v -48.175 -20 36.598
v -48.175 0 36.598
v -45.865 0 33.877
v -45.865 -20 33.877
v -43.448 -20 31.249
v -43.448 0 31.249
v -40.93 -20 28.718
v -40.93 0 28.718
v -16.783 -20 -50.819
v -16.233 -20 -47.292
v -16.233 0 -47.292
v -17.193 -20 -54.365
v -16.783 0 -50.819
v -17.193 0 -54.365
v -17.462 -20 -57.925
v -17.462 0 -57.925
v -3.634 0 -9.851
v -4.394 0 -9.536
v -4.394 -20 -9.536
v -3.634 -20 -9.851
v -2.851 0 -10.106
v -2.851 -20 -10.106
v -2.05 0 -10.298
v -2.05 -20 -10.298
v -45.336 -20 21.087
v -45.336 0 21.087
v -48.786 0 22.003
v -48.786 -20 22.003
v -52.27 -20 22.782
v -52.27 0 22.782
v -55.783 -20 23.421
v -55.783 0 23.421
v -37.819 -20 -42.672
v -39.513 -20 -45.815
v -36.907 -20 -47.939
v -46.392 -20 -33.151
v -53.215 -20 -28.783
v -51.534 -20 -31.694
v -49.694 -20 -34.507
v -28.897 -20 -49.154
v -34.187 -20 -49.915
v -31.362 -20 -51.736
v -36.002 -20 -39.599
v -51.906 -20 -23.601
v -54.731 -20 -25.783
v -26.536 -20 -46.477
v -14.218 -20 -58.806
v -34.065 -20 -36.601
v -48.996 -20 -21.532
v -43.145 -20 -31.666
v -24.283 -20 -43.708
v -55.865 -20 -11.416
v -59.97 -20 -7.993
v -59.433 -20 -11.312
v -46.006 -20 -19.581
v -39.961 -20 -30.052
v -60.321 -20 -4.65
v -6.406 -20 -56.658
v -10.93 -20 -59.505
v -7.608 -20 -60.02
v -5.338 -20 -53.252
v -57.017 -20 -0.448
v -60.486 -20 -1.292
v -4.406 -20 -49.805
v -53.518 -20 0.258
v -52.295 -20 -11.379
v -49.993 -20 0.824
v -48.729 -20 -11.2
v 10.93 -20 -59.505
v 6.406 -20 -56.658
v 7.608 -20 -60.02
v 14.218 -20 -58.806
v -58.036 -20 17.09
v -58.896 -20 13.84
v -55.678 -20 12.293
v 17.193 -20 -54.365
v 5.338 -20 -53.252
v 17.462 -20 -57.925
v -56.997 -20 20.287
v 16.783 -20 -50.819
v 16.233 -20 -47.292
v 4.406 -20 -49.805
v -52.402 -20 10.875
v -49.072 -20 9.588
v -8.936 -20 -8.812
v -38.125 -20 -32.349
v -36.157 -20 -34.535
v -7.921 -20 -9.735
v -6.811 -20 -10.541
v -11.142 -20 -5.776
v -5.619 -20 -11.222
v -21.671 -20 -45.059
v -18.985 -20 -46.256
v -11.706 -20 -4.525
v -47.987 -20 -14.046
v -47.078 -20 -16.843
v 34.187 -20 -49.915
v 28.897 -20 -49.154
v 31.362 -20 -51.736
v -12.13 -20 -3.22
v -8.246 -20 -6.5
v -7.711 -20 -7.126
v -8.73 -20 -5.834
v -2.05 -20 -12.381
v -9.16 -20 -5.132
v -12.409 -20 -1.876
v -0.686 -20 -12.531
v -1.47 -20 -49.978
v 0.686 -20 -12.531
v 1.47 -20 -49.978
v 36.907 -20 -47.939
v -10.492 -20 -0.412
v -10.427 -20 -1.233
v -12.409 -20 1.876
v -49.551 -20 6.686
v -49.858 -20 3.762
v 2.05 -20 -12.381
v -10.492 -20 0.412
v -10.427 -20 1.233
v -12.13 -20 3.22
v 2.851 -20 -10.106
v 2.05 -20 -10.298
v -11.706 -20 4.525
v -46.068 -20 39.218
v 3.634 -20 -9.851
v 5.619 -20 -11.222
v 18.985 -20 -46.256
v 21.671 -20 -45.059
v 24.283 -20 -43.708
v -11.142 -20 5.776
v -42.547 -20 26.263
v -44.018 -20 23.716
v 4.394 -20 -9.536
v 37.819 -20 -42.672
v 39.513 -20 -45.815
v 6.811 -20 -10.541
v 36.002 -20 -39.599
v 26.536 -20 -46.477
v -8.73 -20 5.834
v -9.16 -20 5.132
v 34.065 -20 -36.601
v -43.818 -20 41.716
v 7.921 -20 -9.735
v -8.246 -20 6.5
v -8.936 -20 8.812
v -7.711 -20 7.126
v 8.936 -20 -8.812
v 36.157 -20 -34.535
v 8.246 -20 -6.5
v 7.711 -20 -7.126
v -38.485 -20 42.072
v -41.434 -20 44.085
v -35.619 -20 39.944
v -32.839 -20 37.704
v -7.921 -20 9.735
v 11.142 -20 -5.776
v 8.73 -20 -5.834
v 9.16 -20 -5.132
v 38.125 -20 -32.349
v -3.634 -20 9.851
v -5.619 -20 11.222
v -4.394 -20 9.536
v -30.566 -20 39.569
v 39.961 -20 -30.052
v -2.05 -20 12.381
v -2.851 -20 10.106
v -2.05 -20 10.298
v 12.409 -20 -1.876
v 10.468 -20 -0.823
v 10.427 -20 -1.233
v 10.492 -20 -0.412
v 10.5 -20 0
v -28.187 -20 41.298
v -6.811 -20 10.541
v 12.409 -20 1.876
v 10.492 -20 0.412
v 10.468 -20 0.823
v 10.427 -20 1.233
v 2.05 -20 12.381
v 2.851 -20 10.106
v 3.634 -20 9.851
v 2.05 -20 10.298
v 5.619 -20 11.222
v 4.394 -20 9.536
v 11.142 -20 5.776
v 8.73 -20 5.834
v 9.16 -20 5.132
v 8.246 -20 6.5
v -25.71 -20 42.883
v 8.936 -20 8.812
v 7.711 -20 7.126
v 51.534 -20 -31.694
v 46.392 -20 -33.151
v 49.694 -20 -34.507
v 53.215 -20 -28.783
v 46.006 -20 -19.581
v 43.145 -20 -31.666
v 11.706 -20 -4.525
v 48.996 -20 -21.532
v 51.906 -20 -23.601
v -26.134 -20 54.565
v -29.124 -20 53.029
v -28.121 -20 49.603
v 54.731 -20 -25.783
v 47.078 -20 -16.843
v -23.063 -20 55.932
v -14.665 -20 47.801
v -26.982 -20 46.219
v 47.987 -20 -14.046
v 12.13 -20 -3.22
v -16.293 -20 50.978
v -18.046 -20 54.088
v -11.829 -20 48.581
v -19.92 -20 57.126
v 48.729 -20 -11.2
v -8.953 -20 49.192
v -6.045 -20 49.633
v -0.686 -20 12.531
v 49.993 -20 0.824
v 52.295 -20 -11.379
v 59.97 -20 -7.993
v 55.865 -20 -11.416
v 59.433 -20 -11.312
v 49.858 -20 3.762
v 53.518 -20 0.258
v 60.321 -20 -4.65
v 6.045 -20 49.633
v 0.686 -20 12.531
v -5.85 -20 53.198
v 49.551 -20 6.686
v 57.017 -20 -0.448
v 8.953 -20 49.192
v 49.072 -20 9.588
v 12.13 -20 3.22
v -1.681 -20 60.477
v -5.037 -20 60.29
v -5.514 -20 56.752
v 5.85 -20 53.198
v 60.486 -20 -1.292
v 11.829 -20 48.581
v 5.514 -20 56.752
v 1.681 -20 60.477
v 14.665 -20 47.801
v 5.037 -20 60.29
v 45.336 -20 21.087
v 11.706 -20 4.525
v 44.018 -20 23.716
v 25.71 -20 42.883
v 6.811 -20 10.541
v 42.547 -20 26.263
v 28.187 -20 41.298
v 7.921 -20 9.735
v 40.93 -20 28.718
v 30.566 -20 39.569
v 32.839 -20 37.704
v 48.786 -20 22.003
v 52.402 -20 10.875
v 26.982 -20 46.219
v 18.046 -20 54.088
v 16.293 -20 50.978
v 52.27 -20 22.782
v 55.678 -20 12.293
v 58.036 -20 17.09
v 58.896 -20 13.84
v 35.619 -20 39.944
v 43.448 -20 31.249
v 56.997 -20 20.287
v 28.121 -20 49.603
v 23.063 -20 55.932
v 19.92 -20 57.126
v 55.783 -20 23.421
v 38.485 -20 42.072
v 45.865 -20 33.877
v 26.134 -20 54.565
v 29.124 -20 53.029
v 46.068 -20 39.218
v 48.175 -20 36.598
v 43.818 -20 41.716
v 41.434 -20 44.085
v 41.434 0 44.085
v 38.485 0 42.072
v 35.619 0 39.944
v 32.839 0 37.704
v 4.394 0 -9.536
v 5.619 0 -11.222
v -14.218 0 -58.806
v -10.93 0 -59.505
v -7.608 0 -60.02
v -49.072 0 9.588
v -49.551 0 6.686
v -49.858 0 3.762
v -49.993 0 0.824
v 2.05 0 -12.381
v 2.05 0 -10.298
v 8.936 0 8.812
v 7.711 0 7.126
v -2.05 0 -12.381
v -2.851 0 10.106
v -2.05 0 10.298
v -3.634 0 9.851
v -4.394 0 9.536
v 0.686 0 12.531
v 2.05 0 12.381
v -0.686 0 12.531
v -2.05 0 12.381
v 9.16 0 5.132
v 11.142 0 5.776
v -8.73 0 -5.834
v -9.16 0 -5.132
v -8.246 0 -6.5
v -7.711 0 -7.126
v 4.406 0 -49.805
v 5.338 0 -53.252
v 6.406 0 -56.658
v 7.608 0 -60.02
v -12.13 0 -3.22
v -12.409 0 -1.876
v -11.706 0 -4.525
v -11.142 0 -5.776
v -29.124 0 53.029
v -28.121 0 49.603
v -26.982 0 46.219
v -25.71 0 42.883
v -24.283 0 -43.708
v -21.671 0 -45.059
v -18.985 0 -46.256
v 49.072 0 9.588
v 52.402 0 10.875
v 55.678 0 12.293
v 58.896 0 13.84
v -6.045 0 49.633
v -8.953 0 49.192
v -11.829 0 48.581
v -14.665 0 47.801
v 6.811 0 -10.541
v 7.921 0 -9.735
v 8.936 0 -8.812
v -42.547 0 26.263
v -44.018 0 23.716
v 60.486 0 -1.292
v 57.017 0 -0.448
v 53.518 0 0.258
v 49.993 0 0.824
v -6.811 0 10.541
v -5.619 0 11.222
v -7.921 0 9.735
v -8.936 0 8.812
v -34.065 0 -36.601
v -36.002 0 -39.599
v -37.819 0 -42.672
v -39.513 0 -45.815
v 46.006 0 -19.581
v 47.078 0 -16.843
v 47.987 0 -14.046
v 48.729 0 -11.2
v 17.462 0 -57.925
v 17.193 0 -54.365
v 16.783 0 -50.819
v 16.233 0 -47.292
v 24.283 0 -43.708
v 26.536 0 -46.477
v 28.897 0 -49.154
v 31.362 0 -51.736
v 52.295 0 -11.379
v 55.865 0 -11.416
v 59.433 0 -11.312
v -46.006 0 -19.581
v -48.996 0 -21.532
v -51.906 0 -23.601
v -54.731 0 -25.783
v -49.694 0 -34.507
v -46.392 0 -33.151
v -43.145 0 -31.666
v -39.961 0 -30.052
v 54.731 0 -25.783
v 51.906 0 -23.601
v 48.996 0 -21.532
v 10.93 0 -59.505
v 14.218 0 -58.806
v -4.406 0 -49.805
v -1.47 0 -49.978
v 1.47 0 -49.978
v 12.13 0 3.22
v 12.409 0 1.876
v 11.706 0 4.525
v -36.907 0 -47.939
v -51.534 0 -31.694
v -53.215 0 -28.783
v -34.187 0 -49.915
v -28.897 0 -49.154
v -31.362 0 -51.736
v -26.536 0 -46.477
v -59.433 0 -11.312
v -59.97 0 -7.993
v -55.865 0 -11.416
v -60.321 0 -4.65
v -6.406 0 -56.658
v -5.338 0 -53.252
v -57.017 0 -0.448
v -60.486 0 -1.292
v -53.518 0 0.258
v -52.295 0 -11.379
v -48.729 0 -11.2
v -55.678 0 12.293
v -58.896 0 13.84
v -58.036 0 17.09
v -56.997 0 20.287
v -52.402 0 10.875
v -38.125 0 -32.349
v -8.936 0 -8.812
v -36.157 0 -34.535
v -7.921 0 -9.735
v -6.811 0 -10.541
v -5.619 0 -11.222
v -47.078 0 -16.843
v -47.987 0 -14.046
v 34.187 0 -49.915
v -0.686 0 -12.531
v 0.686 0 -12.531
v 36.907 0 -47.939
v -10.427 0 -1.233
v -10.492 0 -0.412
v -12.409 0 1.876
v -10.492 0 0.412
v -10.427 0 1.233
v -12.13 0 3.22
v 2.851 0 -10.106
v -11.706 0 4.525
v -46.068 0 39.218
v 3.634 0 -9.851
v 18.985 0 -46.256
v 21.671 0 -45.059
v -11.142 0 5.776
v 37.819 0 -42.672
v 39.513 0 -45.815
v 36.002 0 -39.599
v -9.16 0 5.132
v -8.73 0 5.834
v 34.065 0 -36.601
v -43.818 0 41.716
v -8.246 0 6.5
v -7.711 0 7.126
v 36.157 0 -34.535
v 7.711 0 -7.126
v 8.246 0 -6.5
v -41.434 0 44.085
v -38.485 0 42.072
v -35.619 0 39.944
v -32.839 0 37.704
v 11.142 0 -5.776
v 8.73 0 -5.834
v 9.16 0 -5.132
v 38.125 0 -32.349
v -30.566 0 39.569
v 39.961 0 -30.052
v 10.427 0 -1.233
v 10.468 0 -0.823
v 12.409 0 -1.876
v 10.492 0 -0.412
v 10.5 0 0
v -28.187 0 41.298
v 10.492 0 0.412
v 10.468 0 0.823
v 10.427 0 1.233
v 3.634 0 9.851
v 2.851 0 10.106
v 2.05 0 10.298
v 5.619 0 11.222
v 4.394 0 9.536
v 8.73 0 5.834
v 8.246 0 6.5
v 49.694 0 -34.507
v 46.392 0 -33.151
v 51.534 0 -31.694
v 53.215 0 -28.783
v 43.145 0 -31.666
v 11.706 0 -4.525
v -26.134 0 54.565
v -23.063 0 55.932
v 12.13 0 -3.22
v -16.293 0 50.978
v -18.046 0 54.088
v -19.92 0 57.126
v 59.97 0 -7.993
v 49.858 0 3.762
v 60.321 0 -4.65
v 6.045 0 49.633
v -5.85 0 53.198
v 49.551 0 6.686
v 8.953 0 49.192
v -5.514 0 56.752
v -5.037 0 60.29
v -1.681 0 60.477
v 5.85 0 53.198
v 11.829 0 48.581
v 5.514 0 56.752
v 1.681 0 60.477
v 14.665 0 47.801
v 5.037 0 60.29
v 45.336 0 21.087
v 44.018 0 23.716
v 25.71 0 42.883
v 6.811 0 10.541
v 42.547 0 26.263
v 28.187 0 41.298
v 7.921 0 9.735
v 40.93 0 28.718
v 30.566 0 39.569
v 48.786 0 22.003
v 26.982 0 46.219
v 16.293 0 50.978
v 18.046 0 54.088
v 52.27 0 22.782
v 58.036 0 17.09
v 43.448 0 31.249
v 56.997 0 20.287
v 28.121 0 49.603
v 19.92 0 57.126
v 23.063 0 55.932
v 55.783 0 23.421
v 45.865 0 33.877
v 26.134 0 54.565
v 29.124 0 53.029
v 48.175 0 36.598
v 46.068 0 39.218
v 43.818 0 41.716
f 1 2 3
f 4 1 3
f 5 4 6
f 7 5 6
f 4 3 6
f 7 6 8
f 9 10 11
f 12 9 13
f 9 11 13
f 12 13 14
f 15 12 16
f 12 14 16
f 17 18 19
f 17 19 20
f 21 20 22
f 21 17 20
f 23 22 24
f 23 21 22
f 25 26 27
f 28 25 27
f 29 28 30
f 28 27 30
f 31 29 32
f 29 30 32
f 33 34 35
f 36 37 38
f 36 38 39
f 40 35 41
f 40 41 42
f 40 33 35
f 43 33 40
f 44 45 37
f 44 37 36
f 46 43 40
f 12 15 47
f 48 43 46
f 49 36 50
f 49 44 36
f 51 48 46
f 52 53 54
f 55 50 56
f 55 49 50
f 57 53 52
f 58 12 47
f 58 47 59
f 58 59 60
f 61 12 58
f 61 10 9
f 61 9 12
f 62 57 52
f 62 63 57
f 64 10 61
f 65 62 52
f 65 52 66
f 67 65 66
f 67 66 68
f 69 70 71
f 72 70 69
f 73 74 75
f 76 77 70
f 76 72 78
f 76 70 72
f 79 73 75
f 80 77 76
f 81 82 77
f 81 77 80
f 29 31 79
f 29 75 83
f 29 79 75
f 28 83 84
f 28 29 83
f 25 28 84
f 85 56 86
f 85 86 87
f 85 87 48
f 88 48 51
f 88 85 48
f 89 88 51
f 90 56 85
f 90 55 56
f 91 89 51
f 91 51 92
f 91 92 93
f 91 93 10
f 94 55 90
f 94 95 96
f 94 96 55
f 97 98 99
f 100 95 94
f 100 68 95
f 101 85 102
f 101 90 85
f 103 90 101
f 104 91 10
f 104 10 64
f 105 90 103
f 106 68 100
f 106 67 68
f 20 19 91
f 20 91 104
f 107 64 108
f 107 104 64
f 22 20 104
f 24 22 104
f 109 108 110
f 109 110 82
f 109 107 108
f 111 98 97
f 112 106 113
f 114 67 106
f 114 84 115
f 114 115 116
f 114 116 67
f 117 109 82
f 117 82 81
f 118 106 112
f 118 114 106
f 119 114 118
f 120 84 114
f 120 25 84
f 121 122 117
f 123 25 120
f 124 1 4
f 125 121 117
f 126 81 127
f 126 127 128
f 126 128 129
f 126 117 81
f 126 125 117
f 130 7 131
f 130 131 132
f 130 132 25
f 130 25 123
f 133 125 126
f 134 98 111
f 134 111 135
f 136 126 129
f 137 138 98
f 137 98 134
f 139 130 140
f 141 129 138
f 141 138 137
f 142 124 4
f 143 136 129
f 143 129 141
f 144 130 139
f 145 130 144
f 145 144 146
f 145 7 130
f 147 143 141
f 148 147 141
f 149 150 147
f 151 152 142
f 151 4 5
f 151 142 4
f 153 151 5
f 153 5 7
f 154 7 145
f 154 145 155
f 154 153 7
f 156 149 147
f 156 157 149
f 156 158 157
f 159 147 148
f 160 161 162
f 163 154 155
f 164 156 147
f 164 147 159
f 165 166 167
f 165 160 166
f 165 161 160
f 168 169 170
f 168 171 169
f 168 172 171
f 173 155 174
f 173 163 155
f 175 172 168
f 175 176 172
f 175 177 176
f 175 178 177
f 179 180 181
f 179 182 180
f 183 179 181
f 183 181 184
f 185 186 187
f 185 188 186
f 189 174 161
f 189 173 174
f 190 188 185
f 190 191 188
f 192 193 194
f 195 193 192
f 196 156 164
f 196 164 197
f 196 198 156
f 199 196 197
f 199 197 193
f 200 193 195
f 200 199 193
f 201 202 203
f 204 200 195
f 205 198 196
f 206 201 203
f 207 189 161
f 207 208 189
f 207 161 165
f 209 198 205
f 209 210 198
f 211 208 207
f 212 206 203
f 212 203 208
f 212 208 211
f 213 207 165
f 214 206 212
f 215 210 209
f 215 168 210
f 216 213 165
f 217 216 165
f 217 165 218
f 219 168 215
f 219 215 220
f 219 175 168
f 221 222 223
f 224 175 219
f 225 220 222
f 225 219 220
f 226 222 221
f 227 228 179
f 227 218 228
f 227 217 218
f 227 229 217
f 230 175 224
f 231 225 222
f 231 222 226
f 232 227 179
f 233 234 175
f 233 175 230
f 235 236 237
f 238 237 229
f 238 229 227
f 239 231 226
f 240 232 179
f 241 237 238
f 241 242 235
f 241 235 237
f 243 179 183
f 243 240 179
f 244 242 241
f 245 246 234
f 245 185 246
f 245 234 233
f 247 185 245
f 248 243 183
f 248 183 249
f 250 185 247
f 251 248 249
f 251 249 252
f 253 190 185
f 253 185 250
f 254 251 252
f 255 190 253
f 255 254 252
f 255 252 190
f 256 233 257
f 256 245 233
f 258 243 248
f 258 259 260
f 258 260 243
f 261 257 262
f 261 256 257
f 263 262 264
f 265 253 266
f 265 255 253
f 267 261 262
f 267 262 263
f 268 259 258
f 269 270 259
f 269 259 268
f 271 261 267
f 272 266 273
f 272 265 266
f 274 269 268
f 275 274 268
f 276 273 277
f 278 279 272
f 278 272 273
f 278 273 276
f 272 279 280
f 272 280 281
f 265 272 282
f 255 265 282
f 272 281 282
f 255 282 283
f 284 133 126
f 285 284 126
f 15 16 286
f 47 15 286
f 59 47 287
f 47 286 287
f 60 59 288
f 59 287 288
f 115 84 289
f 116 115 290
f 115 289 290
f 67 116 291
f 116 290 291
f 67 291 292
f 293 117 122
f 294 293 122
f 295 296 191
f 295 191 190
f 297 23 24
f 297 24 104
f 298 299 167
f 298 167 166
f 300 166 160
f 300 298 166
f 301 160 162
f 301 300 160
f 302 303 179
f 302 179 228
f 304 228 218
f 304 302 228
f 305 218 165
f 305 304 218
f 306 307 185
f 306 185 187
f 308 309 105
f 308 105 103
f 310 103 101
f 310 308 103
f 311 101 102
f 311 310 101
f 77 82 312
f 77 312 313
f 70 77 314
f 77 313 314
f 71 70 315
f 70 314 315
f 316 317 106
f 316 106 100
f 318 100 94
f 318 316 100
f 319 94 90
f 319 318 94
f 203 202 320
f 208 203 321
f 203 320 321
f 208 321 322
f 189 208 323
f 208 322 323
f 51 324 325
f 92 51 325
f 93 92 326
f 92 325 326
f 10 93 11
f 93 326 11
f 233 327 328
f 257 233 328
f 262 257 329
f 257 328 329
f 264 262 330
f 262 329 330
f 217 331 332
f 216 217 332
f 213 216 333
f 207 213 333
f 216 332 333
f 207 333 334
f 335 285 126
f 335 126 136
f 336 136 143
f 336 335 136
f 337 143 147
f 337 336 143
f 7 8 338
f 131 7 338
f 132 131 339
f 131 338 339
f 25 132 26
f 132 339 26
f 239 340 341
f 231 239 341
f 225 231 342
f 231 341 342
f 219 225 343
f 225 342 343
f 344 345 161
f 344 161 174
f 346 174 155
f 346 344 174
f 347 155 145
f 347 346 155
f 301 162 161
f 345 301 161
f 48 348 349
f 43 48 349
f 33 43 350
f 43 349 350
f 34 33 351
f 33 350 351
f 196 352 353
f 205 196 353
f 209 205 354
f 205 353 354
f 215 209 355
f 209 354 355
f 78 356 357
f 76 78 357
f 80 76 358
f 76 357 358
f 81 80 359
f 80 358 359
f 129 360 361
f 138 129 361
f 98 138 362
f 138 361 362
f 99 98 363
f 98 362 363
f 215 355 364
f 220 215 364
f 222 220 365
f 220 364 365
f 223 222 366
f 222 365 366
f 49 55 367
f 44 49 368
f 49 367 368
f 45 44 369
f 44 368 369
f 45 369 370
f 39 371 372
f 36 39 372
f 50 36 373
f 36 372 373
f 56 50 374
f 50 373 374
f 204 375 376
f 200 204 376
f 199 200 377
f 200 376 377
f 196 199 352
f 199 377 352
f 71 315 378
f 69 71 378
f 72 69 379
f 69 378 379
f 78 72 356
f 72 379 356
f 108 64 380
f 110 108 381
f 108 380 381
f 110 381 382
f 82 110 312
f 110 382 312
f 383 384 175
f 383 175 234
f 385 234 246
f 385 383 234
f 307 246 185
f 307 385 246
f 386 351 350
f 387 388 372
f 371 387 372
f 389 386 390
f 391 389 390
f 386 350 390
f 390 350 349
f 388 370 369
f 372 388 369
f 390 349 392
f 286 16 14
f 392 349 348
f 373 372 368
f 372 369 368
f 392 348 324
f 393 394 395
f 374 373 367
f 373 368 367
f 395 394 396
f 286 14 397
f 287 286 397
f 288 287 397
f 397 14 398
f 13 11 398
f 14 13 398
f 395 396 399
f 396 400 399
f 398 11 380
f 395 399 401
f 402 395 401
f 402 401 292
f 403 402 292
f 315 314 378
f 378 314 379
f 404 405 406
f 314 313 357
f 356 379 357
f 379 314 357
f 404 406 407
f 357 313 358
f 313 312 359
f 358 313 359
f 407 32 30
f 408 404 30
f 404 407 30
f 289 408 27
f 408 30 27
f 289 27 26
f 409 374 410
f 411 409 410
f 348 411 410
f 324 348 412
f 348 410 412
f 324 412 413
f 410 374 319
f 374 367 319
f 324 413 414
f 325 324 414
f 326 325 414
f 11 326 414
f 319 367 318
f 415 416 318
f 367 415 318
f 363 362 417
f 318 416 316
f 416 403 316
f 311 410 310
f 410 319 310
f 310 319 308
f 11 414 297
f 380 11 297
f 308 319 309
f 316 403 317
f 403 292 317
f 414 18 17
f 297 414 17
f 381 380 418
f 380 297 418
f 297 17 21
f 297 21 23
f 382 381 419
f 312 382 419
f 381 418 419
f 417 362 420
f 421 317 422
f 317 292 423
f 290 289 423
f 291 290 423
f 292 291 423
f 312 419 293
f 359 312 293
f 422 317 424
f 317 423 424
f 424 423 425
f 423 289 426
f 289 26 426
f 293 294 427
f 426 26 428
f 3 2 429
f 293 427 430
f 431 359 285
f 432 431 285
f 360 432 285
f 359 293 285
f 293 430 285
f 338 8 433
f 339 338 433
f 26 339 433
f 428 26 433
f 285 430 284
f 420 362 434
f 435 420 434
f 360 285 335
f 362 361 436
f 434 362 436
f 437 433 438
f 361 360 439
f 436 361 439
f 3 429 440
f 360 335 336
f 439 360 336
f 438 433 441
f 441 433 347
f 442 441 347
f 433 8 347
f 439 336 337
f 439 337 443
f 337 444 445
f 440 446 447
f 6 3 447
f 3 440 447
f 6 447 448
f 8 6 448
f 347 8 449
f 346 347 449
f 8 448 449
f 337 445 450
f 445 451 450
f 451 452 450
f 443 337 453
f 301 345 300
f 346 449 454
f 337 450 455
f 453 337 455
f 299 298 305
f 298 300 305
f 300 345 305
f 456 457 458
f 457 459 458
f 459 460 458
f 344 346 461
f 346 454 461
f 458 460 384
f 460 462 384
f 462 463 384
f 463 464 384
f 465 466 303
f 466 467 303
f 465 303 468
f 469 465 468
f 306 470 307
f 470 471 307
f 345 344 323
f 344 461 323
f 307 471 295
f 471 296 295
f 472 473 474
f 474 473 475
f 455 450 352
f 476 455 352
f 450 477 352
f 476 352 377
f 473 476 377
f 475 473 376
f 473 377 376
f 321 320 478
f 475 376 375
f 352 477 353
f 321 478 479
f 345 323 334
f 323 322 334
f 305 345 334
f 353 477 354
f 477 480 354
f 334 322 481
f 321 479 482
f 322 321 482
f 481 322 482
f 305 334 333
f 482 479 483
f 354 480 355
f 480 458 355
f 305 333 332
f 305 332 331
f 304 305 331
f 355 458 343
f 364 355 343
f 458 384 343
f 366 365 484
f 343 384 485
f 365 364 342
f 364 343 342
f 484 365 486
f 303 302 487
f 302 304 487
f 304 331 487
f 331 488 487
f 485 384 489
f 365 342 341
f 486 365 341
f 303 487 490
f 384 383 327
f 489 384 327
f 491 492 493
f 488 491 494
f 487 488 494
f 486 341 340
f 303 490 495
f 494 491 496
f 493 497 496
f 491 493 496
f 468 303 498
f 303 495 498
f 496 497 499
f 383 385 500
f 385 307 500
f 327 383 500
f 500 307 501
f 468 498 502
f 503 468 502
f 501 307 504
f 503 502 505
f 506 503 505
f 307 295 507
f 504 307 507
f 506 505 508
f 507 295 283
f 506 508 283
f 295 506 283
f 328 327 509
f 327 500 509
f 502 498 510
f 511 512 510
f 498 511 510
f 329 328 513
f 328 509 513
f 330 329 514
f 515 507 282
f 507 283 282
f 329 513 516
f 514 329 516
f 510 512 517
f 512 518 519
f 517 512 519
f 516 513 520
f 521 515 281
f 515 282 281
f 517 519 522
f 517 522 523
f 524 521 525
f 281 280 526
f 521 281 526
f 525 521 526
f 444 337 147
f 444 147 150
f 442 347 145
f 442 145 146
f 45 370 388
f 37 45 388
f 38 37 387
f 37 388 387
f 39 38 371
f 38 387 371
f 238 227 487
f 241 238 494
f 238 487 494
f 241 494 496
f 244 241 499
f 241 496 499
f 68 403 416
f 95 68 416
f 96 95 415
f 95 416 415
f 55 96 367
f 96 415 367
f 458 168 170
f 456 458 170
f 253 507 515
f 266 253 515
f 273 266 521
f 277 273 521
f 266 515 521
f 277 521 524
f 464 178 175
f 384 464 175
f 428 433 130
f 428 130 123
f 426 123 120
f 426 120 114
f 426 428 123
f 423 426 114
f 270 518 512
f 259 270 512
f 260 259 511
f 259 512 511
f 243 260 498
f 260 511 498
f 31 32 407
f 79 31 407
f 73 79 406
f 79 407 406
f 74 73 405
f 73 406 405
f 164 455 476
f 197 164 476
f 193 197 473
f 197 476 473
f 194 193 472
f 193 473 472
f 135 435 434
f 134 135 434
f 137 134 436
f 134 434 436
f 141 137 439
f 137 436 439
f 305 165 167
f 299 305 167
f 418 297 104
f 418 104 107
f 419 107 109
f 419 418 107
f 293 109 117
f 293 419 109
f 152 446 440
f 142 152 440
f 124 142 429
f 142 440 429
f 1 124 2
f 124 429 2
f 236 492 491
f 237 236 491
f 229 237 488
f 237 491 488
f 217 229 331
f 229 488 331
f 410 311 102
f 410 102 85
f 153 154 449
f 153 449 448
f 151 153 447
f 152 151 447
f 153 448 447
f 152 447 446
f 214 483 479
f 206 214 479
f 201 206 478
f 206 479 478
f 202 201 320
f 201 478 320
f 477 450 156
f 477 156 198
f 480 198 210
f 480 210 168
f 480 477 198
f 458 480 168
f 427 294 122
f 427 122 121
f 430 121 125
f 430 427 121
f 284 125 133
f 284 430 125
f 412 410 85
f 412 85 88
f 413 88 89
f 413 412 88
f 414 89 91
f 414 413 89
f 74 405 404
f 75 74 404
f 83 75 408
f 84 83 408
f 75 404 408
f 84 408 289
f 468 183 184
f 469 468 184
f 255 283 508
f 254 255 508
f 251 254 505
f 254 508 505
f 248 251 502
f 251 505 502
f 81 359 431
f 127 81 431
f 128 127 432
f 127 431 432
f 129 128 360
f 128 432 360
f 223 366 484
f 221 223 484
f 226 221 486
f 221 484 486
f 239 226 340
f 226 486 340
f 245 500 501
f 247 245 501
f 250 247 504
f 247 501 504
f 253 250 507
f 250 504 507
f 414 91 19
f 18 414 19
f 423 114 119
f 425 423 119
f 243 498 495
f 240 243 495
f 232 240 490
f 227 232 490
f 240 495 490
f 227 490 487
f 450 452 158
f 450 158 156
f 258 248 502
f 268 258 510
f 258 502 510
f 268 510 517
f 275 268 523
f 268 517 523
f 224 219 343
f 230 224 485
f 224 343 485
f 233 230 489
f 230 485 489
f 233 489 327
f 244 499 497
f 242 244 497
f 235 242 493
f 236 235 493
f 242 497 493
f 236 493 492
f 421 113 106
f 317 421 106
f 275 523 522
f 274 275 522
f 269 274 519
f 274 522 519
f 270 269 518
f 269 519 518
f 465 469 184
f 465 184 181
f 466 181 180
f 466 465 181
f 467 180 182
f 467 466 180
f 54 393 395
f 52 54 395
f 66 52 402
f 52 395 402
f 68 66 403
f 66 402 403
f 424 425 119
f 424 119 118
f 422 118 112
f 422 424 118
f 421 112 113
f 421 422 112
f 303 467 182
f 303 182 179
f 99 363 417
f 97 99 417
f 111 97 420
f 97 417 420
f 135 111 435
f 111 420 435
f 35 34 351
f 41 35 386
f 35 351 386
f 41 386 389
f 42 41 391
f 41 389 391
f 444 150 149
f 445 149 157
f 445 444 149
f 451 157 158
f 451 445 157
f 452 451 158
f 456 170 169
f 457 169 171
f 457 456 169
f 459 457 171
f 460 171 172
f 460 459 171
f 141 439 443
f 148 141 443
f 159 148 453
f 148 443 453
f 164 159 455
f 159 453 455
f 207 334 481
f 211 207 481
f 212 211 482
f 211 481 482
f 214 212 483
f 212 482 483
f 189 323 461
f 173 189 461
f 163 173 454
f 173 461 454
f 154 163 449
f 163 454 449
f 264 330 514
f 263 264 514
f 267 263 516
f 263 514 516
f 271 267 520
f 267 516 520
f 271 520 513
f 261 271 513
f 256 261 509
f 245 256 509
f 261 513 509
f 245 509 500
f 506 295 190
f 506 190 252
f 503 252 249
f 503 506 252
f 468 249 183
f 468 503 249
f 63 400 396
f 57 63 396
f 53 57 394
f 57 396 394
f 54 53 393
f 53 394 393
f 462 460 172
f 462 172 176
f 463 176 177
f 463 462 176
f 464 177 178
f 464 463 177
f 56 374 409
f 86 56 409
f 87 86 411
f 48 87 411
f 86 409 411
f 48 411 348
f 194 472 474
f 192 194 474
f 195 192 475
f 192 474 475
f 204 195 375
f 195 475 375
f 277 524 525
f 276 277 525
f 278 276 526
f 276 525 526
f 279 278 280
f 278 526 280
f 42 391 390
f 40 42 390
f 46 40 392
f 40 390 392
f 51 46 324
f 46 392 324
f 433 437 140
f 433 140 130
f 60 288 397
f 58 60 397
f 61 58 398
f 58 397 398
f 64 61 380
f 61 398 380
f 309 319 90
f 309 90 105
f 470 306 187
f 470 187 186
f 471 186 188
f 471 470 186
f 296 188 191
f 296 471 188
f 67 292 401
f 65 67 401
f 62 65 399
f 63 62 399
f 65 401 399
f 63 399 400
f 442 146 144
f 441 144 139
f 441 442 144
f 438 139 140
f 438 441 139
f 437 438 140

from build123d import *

# Parameters (mm, degrees)
F1_DEPTH = 20
F3_DEPTH = 20


with BuildPart() as f1:
    # F0 (on Front) → F1 (new body)
    with BuildSketch(Plane.XZ):
        with BuildLine():
            ThreePointArc((48.729363, -11.200408), (49.681325, -5.636126), (50, 0))
            ThreePointArc((50, 0), (49.998301, 0.412138), (49.993206, 0.824248))
            ThreePointArc((49.993206, 0.824248), (49.726095, 5.226423), (49.072105, 9.587936))
            ThreePointArc((49.072105, 9.587936), (47.552826, 15.45085), (45.335814, 21.087057))
            ThreePointArc((45.335814, 21.087057), (43.30127, 25), (40.929834, 28.718438))
            ThreePointArc((40.929834, 28.718438), (37.157241, 33.45653), (32.839448, 37.703722))
            ThreePointArc((32.839448, 37.703722), (29.389263, 40.45085), (25.710422, 42.883262))
            ThreePointArc((25.710422, 42.883262), (20.336832, 45.677273), (14.664844, 47.801071))
            ThreePointArc((14.664844, 47.801071), (10.395585, 48.90738), (6.045446, 49.63318))
            ThreePointArc((6.045446, 49.63318), (0, 50), (-6.045446, 49.63318))
            ThreePointArc((-6.045446, 49.63318), (-10.395585, 48.90738), (-14.664844, 47.801071))
            ThreePointArc((-14.664844, 47.801071), (-20.336832, 45.677273), (-25.710422, 42.883262))
            ThreePointArc((-25.710422, 42.883262), (-29.389263, 40.45085), (-32.839448, 37.703722))
            ThreePointArc((-32.839448, 37.703722), (-37.157241, 33.45653), (-40.929834, 28.718438))
            ThreePointArc((-40.929834, 28.718438), (-43.30127, 25), (-45.335814, 21.087057))
            ThreePointArc((-45.335814, 21.087057), (-47.552826, 15.45085), (-49.072105, 9.587936))
            ThreePointArc((-49.072105, 9.587936), (-49.726095, 5.226423), (-49.993206, 0.824248))
            ThreePointArc((-49.993206, 0.824248), (-49.726095, -5.226423), (-48.729363, -11.200408))
            ThreePointArc((-48.729363, -11.200408), (-47.552826, -15.45085), (-46.006318, -19.581081))
            ThreePointArc((-46.006318, -19.581081), (-43.30127, -25), (-39.960872, -30.0521))
            ThreePointArc((-39.960872, -30.0521), (-37.157241, -33.45653), (-34.06452, -36.600663))
            ThreePointArc((-34.06452, -36.600663), (-29.389263, -40.45085), (-24.282783, -43.70751))
            ThreePointArc((-24.282783, -43.70751), (-20.336832, -45.677273), (-16.232657, -47.291657))
            ThreePointArc((-16.232657, -47.291657), (-10.395585, -48.90738), (-4.40598, -49.805495))
            ThreePointArc((-4.40598, -49.805495), (0, -50), (4.40598, -49.805495))
            ThreePointArc((4.40598, -49.805495), (10.395585, -48.90738), (16.232657, -47.291657))
            ThreePointArc((16.232657, -47.291657), (20.336832, -45.677273), (24.282783, -43.70751))
            ThreePointArc((24.282783, -43.70751), (29.389263, -40.45085), (34.06452, -36.600663))
            ThreePointArc((34.06452, -36.600663), (37.157241, -33.45653), (39.960872, -30.0521))
            ThreePointArc((39.960872, -30.0521), (43.30127, -25), (46.006318, -19.581081))
            ThreePointArc((46.006318, -19.581081), (47.552826, -15.45085), (48.729363, -11.200408))
        make_face()
        with BuildLine():
            ThreePointArc((-25.710422, 42.883262), (-20.336832, 45.677273), (-14.664844, 47.801071))
            ThreePointArc((-14.664844, 47.801071), (-17.153833, 52.541957), (-19.920351, 57.126435))
            ThreePointArc((-19.920351, 57.126435), (-24.607567, 55.2695), (-29.123899, 53.028752))
            ThreePointArc((-29.123899, 53.028752), (-27.568128, 47.905214), (-25.710422, 42.883262))
        make_face()
        with BuildLine():
            ThreePointArc((-6.045446, 49.63318), (0, 50), (6.045446, 49.63318))
            ThreePointArc((6.045446, 49.63318), (5.699933, 54.976558), (5.037269, 60.289932))
            ThreePointArc((5.037269, 60.289932), (0, 60.5), (-5.037269, 60.289932))
            ThreePointArc((-5.037269, 60.289932), (-5.699933, 54.976558), (-6.045446, 49.63318))
        make_face()
        with BuildLine():
            ThreePointArc((14.664844, 47.801071), (20.336832, 45.677273), (25.710422, 42.883262))
            ThreePointArc((25.710422, 42.883262), (27.568128, 47.905214), (29.123899, 53.028752))
            ThreePointArc((29.123899, 53.028752), (24.607567, 55.2695), (19.920351, 57.126435))
            ThreePointArc((19.920351, 57.126435), (17.153833, 52.541957), (14.664844, 47.801071))
        make_face()
        with BuildLine():
            ThreePointArc((32.839448, 37.703722), (37.157241, 33.45653), (40.929834, 28.718438))
            ThreePointArc((40.929834, 28.718438), (44.669544, 32.550622), (48.174742, 36.598419))
            ThreePointArc((48.174742, 36.598419), (44.960262, 40.482402), (41.43356, 44.085259))
            ThreePointArc((41.43356, 44.085259), (37.041545, 41.022373), (32.839448, 37.703722))
        make_face()
        with BuildLine():
            ThreePointArc((45.335814, 21.087057), (47.552826, 15.45085), (49.072105, 9.587936))
            ThreePointArc((49.072105, 9.587936), (54.04719, 11.567733), (58.895735, 13.839886))
            ThreePointArc((58.895735, 13.839886), (57.538919, 18.695528), (55.782531, 23.421341))
            ThreePointArc((55.782531, 23.421341), (50.524438, 22.409649), (45.335814, 21.087057))
        make_face()
        with BuildLine():
            ThreePointArc((49.993206, 0.824248), (49.998301, 0.412138), (50, 0))
            ThreePointArc((50, 0), (49.681325, -5.636126), (48.729363, -11.200408))
            ThreePointArc((48.729363, -11.200408), (54.079586, -11.415323), (59.43312, -11.311688))
            ThreePointArc((59.43312, -11.311688), (60.168575, -6.323972), (60.486196, -1.29234))
            ThreePointArc((60.486196, -1.29234), (55.271196, -0.077907), (49.993206, 0.824248))
        make_face()
        with BuildLine():
            ThreePointArc((54.731247, -25.782563), (50.461062, -22.551992), (46.006318, -19.581081))
            ThreePointArc((46.006318, -19.581081), (43.30127, -25), (39.960872, -30.0521))
            ThreePointArc((39.960872, -30.0521), (44.76113, -32.424566), (49.693979, -34.507369))
            ThreePointArc((49.693979, -34.507369), (52.394537, -30.25), (54.731247, -25.782563))
        make_face()
        with BuildLine():
            ThreePointArc((39.512769, -45.814747), (36.925753, -41.126633), (34.06452, -36.600663))
            ThreePointArc((34.06452, -36.600663), (29.389263, -40.45085), (24.282783, -43.70751))
            ThreePointArc((24.282783, -43.70751), (27.703068, -47.827306), (31.362297, -51.736412))
            ThreePointArc((31.362297, -51.736412), (35.561008, -48.945528), (39.512769, -45.814747))
        make_face()
        with BuildLine():
            ThreePointArc((17.462174, -57.925145), (17.005645, -52.590106), (16.232657, -47.291657))
            ThreePointArc((16.232657, -47.291657), (10.395585, -48.90738), (4.40598, -49.805495))
            ThreePointArc((4.40598, -49.805495), (5.854894, -54.960271), (7.607789, -60.01976))
            ThreePointArc((7.607789, -60.01976), (12.578657, -59.17793), (17.462174, -57.925145))
        make_face()
        with BuildLine():
            ThreePointArc((-7.607789, -60.01976), (-5.854894, -54.960271), (-4.40598, -49.805495))
            ThreePointArc((-4.40598, -49.805495), (-10.395585, -48.90738), (-16.232657, -47.291657))
            ThreePointArc((-16.232657, -47.291657), (-17.005645, -52.590106), (-17.462174, -57.925145))
            ThreePointArc((-17.462174, -57.925145), (-12.578657, -59.17793), (-7.607789, -60.01976))
        make_face()
        with BuildLine():
            ThreePointArc((-31.362297, -51.736412), (-27.703068, -47.827306), (-24.282783, -43.70751))
            ThreePointArc((-24.282783, -43.70751), (-29.389263, -40.45085), (-34.06452, -36.600663))
            ThreePointArc((-34.06452, -36.600663), (-36.925753, -41.126633), (-39.512769, -45.814747))
            ThreePointArc((-39.512769, -45.814747), (-35.561008, -48.945528), (-31.362297, -51.736412))
        make_face()
        with BuildLine():
            ThreePointArc((-49.693979, -34.507369), (-44.76113, -32.424566), (-39.960872, -30.0521))
            ThreePointArc((-39.960872, -30.0521), (-43.30127, -25), (-46.006318, -19.581081))
            ThreePointArc((-46.006318, -19.581081), (-50.461062, -22.551992), (-54.731247, -25.782563))
            ThreePointArc((-54.731247, -25.782563), (-52.394537, -30.25), (-49.693979, -34.507369))
        make_face()
        with BuildLine():
            ThreePointArc((-59.43312, -11.311688), (-54.079586, -11.415323), (-48.729363, -11.200408))
            ThreePointArc((-48.729363, -11.200408), (-49.726095, -5.226423), (-49.993206, 0.824248))
            ThreePointArc((-49.993206, 0.824248), (-55.271196, -0.077907), (-60.486196, -1.29234))
            ThreePointArc((-60.486196, -1.29234), (-60.168575, -6.323972), (-59.43312, -11.311688))
        make_face()
        with BuildLine():
            ThreePointArc((-49.072105, 9.587936), (-47.552826, 15.45085), (-45.335814, 21.087057))
            ThreePointArc((-45.335814, 21.087057), (-50.524438, 22.409649), (-55.782531, 23.421341))
            ThreePointArc((-55.782531, 23.421341), (-57.538919, 18.695528), (-58.895735, 13.839886))
            ThreePointArc((-58.895735, 13.839886), (-54.04719, 11.567733), (-49.072105, 9.587936))
        make_face()
        with BuildLine():
            ThreePointArc((-40.929834, 28.718438), (-37.157241, 33.45653), (-32.839448, 37.703722))
            ThreePointArc((-32.839448, 37.703722), (-37.041545, 41.022373), (-41.43356, 44.085259))
            ThreePointArc((-41.43356, 44.085259), (-44.960262, 40.482402), (-48.174742, 36.598419))
            ThreePointArc((-48.174742, 36.598419), (-44.669544, 32.550622), (-40.929834, 28.718438))
        make_face()
    extrude(amount=F1_DEPTH)

    # F2 (on Front) → F3 (cut)
    with BuildSketch(Plane.XZ):
        with BuildLine():
            ThreePointArc((10.427405, -1.232572), (10.481835, -0.617354), (10.5, 0))
            ThreePointArc((10.5, 0), (10.481835, 0.617354), (10.427405, 1.232572))
            ThreePointArc((10.427405, 1.232572), (9.986093, 3.244678), (9.160435, 5.131903))
            ThreePointArc((9.160435, 5.131903), (8.494678, 6.171745), (7.71146, 7.126246))
            ThreePointArc((7.71146, 7.126246), (6.171745, 8.494678), (4.39449, 9.536166))
            ThreePointArc((4.39449, 9.536166), (3.244678, 9.986093), (2.05, 10.297937))
            ThreePointArc((2.05, 10.297937), (0, 10.5), (-2.05, 10.297937))
            ThreePointArc((-2.05, 10.297937), (-3.244678, 9.986093), (-4.39449, 9.536166))
            ThreePointArc((-4.39449, 9.536166), (-6.171745, 8.494678), (-7.71146, 7.126246))
            ThreePointArc((-7.71146, 7.126246), (-8.494678, 6.171745), (-9.160435, 5.131903))
            ThreePointArc((-9.160435, 5.131903), (-9.986093, 3.244678), (-10.427405, 1.232572))
            ThreePointArc((-10.427405, 1.232572), (-10.5, 0), (-10.427405, -1.232572))
            ThreePointArc((-10.427405, -1.232572), (-9.986093, -3.244678), (-9.160435, -5.131903))
            ThreePointArc((-9.160435, -5.131903), (-8.494678, -6.171745), (-7.71146, -7.126246))
            ThreePointArc((-7.71146, -7.126246), (-6.171745, -8.494678), (-4.39449, -9.536166))
            ThreePointArc((-4.39449, -9.536166), (-3.244678, -9.986093), (-2.05, -10.297937))
            ThreePointArc((-2.05, -10.297937), (0, -10.5), (2.05, -10.297937))
            ThreePointArc((2.05, -10.297937), (3.244678, -9.986093), (4.39449, -9.536166))
            ThreePointArc((4.39449, -9.536166), (6.171745, -8.494678), (7.71146, -7.126246))
            ThreePointArc((7.71146, -7.126246), (8.494678, -6.171745), (9.160435, -5.131903))
            ThreePointArc((9.160435, -5.131903), (9.986093, -3.244678), (10.427405, -1.232572))
        make_face()
        with BuildLine():
            ThreePointArc((-7.71146, 7.126246), (-6.171745, 8.494678), (-4.39449, 9.536166))
            Line((-4.39449, 9.536166), (-5.619142, 11.221753))
            ThreePointArc((-5.619142, 11.221753), (-7.376705, 10.153163), (-8.936111, 8.811834))
            Line((-8.936111, 8.811834), (-7.71146, 7.126246))
        make_face()
        with BuildLine():
            ThreePointArc((-10.427405, 1.232572), (-9.986093, 3.244678), (-9.160435, 5.131903))
            Line((-9.160435, 5.131903), (-11.141962, 5.775741))
            ThreePointArc((-11.141962, 5.775741), (-11.935759, 3.878163), (-12.408932, 1.876409))
            Line((-12.408932, 1.876409), (-10.427405, 1.232572))
        make_face()
        with BuildLine():
            ThreePointArc((-2.05, 10.297937), (0, 10.5), (2.05, 10.297937))
            Line((2.05, 10.297937), (2.05, 12.381438))
            ThreePointArc((2.05, 12.381438), (0, 12.55), (-2.05, 12.381438))
            Line((-2.05, 12.381438), (-2.05, 10.297937))
        make_face()
        with BuildLine():
            ThreePointArc((4.39449, 9.536166), (6.171745, 8.494678), (7.71146, 7.126246))
            Line((7.71146, 7.126246), (8.936111, 8.811834))
            ThreePointArc((8.936111, 8.811834), (7.376705, 10.153163), (5.619142, 11.221753))
            Line((5.619142, 11.221753), (4.39449, 9.536166))
        make_face()
        with BuildLine():
            ThreePointArc((9.160435, 5.131903), (9.986093, 3.244678), (10.427405, 1.232572))
            Line((10.427405, 1.232572), (12.408932, 1.876409))
            ThreePointArc((12.408932, 1.876409), (11.935759, 3.878163), (11.141962, 5.775741))
            Line((11.141962, 5.775741), (9.160435, 5.131903))
        make_face()
        with BuildLine():
            Line((12.408932, -1.876409), (10.427405, -1.232572))
            ThreePointArc((10.427405, -1.232572), (9.986093, -3.244678), (9.160435, -5.131903))
            Line((9.160435, -5.131903), (11.141962, -5.775741))
            ThreePointArc((11.141962, -5.775741), (11.935759, -3.878163), (12.408932, -1.876409))
        make_face()
        with BuildLine():
            Line((8.936111, -8.811834), (7.71146, -7.126246))
            ThreePointArc((7.71146, -7.126246), (6.171745, -8.494678), (4.39449, -9.536166))
            Line((4.39449, -9.536166), (5.619142, -11.221753))
            ThreePointArc((5.619142, -11.221753), (7.376705, -10.153163), (8.936111, -8.811834))
        make_face()
        with BuildLine():
            Line((2.05, -12.381438), (2.05, -10.297937))
            ThreePointArc((2.05, -10.297937), (0, -10.5), (-2.05, -10.297937))
            Line((-2.05, -10.297937), (-2.05, -12.381438))
            ThreePointArc((-2.05, -12.381438), (0, -12.55), (2.05, -12.381438))
        make_face()
        with BuildLine():
            Line((-5.619142, -11.221753), (-4.39449, -9.536166))
            ThreePointArc((-4.39449, -9.536166), (-6.171745, -8.494678), (-7.71146, -7.126246))
            Line((-7.71146, -7.126246), (-8.936111, -8.811834))
            ThreePointArc((-8.936111, -8.811834), (-7.376705, -10.153163), (-5.619142, -11.221753))
        make_face()
        with BuildLine():
            Line((-11.141962, -5.775741), (-9.160435, -5.131903))
            ThreePointArc((-9.160435, -5.131903), (-9.986093, -3.244678), (-10.427405, -1.232572))
            Line((-10.427405, -1.232572), (-12.408932, -1.876409))
            ThreePointArc((-12.408932, -1.876409), (-11.935759, -3.878163), (-11.141962, -5.775741))
        make_face()
    extrude(amount=F3_DEPTH, mode=Mode.SUBTRACT)


solid = f1.part
